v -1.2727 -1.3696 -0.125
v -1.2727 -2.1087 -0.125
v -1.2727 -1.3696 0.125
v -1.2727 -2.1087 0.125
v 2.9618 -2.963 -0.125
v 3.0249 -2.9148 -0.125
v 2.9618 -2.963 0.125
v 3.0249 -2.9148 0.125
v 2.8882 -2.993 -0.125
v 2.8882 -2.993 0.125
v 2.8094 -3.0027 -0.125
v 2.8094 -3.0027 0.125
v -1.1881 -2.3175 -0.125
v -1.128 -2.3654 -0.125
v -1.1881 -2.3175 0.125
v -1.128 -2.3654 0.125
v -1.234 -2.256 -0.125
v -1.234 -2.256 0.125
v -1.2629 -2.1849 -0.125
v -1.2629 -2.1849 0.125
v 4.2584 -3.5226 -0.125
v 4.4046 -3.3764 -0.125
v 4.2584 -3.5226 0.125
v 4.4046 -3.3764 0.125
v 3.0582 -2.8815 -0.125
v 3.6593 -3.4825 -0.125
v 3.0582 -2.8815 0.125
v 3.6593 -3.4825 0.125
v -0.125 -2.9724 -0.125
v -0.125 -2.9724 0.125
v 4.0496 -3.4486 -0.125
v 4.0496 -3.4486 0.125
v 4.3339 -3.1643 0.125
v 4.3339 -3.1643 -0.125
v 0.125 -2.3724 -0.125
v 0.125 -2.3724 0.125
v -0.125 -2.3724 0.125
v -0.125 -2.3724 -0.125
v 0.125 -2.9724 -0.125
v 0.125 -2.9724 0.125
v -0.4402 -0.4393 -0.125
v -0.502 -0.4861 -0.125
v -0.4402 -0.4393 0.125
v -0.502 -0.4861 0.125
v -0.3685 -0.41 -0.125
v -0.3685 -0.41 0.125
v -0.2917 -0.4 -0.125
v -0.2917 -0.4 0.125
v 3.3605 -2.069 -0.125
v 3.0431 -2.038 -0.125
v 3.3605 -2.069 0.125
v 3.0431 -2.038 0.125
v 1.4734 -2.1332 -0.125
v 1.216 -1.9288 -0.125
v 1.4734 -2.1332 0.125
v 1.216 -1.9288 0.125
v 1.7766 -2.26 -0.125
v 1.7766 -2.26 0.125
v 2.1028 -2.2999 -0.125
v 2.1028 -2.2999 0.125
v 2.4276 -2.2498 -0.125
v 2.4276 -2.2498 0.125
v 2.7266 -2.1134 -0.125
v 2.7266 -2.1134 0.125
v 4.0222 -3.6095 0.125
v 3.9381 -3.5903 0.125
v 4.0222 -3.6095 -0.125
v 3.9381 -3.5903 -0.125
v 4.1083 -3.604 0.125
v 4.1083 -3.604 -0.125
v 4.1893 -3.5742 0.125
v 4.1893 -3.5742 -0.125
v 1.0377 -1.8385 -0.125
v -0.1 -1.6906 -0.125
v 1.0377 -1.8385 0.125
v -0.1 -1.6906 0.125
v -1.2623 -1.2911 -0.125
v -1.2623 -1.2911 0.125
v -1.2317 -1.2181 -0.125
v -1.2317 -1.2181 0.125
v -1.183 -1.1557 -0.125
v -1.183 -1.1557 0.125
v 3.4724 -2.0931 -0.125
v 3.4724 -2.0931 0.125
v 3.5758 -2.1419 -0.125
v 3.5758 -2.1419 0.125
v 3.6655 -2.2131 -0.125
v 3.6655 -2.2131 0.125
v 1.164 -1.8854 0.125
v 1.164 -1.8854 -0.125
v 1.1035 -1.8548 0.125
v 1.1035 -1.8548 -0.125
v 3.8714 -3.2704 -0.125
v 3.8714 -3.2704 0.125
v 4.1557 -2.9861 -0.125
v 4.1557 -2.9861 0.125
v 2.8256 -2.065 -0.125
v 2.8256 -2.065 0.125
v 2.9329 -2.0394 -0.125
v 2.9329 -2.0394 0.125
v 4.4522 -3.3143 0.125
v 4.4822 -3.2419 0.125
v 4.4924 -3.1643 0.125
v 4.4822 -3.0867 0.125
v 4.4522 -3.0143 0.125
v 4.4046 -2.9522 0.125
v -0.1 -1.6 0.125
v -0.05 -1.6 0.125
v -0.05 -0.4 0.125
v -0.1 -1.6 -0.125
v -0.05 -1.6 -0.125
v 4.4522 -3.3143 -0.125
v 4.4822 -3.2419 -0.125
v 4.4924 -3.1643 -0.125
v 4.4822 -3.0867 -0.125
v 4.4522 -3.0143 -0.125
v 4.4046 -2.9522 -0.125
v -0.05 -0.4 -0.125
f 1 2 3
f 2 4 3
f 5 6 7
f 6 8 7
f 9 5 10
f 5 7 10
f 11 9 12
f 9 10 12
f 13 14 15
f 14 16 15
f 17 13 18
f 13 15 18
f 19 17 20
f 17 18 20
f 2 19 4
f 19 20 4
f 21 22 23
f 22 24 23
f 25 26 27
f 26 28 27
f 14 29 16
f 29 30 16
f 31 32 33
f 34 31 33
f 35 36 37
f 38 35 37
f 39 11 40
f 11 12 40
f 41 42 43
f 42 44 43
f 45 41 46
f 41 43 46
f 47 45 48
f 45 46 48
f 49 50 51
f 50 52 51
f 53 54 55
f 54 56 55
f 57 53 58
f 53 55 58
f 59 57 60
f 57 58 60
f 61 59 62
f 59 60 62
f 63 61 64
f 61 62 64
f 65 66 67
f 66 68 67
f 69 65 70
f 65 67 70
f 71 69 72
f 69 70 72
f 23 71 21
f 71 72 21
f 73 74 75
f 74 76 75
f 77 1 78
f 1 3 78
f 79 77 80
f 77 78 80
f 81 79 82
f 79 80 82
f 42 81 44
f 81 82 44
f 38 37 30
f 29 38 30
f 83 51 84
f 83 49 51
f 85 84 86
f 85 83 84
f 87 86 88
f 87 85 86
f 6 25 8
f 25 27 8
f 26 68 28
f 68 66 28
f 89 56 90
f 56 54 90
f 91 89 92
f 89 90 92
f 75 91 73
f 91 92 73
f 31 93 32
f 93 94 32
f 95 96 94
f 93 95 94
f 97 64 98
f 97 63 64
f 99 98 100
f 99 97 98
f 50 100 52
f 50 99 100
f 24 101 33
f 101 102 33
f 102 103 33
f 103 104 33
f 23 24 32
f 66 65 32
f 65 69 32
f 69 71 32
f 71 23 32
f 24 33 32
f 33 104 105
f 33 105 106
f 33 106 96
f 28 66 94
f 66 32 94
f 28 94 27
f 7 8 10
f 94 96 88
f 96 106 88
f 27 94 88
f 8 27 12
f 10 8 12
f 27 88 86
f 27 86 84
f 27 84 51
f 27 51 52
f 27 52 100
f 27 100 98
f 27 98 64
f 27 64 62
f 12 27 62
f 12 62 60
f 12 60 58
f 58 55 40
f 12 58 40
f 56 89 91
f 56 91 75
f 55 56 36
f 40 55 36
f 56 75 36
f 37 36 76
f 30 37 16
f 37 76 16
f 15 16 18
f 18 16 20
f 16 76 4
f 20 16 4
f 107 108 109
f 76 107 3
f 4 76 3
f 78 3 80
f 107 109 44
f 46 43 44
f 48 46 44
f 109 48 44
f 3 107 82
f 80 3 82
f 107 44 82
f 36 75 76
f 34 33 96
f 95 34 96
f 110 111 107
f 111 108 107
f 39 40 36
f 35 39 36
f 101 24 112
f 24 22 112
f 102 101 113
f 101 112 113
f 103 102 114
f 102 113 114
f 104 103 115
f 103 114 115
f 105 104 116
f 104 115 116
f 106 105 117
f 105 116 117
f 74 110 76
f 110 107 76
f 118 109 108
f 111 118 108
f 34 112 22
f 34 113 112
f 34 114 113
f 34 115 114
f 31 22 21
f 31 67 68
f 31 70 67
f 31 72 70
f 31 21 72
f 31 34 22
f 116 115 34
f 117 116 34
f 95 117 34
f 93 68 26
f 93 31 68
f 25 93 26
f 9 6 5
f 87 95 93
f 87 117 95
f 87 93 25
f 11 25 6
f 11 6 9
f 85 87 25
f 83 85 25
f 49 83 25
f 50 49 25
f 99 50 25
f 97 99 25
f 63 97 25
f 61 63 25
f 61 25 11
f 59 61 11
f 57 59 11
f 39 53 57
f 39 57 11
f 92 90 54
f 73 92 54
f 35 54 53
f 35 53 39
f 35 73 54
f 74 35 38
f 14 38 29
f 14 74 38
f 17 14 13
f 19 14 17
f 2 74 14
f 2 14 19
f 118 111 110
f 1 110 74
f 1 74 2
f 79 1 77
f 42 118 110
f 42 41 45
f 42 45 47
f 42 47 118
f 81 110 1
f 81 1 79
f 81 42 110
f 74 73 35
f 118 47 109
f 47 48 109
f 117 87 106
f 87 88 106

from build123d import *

# Parameters (mm, degrees)
BOSS_EXTRUDE1_DEPTH = 0.125
FILLET1_R           = 0.3
FILLET2_R           = 0.5


with BuildPart() as part:
    # frame_outline → Boss-Extrude1 (new, symmetric)
    with BuildSketch(Plane.XY):
        with BuildLine():
            Line((-0.05, -0.4), (-0.05, -1.6))
            Line((-0.05, -1.6), (-0.1, -1.6))
            Line((-0.1, -1.6), (-0.1, -1.690631342))
            Line((-0.1, -1.690631342), (1.149530794, -1.853054692))
            ThreePointArc((1.149530794, -1.853054692), (1.967232196, -2.294374324), (2.854868829, -2.019602037))
            Line((2.854868829, -2.019602037), (3.538793019, -2.08639569))
            Line((3.538793019, -2.08639569), (4.616700174, -3.164302846))
            Line((4.616700174, -3.164302846), (4.120311214, -3.660691806))
            Line((4.120311214, -3.660691806), (3.659277593, -3.482500897))
            Line((3.659277593, -3.482500897), (3.058236829, -2.881460133))
            Line((3.058236829, -2.881460133), (2.935621241, -3.004075721))
            Line((2.935621241, -3.004075721), (0.125, -2.972356033))
            Line((0.125, -2.972356033), (0.125, -2.372356033))
            Line((0.125, -2.372356033), (-0.125, -2.372356033))
            Line((-0.125, -2.372356033), (-0.125, -2.972356033))
            Line((-0.125, -2.972356033), (-1.272695348, -2.277821671))
            Line((-1.272695348, -2.277821671), (-1.272695348, -1.243831616))
            Line((-1.272695348, -1.243831616), (-0.414440871, -0.4))
            Line((-0.414440871, -0.4), (-0.05, -0.4))
        make_face()
        Polygon((3.871409627, -3.270368863), (4.049600536, -3.448559772), (4.333857462, -3.164302846), (4.155666553, -2.986111937), align=None, mode=Mode.SUBTRACT)
    extrude(amount=BOSS_EXTRUDE1_DEPTH, both=True)

    # Fillet1
    fillet1_edges = [part.edges().sort_by_distance(p)[0] for p in [
        (-1.272695348, -1.243831616, 0),
        (-0.414440871, -0.4, 0),
        (1.149530794, -1.853054692, 0),
        (4.616700174, -3.164302846, 0),
        (4.120311214, -3.660691806, 0),
        (2.935621241, -3.004075721, 0),
        (-1.272695348, -2.277821671, 0),
    ]]
    fillet(fillet1_edges, radius=FILLET1_R)

    # Fillet2
    fillet2_edges = [part.edges().sort_by_distance(p)[0] for p in [
        (2.854868829, -2.019602037, 0),
        (3.538793019, -2.08639569, 0),
    ]]
    fillet(fillet2_edges, radius=FILLET2_R)


solid = part.part
